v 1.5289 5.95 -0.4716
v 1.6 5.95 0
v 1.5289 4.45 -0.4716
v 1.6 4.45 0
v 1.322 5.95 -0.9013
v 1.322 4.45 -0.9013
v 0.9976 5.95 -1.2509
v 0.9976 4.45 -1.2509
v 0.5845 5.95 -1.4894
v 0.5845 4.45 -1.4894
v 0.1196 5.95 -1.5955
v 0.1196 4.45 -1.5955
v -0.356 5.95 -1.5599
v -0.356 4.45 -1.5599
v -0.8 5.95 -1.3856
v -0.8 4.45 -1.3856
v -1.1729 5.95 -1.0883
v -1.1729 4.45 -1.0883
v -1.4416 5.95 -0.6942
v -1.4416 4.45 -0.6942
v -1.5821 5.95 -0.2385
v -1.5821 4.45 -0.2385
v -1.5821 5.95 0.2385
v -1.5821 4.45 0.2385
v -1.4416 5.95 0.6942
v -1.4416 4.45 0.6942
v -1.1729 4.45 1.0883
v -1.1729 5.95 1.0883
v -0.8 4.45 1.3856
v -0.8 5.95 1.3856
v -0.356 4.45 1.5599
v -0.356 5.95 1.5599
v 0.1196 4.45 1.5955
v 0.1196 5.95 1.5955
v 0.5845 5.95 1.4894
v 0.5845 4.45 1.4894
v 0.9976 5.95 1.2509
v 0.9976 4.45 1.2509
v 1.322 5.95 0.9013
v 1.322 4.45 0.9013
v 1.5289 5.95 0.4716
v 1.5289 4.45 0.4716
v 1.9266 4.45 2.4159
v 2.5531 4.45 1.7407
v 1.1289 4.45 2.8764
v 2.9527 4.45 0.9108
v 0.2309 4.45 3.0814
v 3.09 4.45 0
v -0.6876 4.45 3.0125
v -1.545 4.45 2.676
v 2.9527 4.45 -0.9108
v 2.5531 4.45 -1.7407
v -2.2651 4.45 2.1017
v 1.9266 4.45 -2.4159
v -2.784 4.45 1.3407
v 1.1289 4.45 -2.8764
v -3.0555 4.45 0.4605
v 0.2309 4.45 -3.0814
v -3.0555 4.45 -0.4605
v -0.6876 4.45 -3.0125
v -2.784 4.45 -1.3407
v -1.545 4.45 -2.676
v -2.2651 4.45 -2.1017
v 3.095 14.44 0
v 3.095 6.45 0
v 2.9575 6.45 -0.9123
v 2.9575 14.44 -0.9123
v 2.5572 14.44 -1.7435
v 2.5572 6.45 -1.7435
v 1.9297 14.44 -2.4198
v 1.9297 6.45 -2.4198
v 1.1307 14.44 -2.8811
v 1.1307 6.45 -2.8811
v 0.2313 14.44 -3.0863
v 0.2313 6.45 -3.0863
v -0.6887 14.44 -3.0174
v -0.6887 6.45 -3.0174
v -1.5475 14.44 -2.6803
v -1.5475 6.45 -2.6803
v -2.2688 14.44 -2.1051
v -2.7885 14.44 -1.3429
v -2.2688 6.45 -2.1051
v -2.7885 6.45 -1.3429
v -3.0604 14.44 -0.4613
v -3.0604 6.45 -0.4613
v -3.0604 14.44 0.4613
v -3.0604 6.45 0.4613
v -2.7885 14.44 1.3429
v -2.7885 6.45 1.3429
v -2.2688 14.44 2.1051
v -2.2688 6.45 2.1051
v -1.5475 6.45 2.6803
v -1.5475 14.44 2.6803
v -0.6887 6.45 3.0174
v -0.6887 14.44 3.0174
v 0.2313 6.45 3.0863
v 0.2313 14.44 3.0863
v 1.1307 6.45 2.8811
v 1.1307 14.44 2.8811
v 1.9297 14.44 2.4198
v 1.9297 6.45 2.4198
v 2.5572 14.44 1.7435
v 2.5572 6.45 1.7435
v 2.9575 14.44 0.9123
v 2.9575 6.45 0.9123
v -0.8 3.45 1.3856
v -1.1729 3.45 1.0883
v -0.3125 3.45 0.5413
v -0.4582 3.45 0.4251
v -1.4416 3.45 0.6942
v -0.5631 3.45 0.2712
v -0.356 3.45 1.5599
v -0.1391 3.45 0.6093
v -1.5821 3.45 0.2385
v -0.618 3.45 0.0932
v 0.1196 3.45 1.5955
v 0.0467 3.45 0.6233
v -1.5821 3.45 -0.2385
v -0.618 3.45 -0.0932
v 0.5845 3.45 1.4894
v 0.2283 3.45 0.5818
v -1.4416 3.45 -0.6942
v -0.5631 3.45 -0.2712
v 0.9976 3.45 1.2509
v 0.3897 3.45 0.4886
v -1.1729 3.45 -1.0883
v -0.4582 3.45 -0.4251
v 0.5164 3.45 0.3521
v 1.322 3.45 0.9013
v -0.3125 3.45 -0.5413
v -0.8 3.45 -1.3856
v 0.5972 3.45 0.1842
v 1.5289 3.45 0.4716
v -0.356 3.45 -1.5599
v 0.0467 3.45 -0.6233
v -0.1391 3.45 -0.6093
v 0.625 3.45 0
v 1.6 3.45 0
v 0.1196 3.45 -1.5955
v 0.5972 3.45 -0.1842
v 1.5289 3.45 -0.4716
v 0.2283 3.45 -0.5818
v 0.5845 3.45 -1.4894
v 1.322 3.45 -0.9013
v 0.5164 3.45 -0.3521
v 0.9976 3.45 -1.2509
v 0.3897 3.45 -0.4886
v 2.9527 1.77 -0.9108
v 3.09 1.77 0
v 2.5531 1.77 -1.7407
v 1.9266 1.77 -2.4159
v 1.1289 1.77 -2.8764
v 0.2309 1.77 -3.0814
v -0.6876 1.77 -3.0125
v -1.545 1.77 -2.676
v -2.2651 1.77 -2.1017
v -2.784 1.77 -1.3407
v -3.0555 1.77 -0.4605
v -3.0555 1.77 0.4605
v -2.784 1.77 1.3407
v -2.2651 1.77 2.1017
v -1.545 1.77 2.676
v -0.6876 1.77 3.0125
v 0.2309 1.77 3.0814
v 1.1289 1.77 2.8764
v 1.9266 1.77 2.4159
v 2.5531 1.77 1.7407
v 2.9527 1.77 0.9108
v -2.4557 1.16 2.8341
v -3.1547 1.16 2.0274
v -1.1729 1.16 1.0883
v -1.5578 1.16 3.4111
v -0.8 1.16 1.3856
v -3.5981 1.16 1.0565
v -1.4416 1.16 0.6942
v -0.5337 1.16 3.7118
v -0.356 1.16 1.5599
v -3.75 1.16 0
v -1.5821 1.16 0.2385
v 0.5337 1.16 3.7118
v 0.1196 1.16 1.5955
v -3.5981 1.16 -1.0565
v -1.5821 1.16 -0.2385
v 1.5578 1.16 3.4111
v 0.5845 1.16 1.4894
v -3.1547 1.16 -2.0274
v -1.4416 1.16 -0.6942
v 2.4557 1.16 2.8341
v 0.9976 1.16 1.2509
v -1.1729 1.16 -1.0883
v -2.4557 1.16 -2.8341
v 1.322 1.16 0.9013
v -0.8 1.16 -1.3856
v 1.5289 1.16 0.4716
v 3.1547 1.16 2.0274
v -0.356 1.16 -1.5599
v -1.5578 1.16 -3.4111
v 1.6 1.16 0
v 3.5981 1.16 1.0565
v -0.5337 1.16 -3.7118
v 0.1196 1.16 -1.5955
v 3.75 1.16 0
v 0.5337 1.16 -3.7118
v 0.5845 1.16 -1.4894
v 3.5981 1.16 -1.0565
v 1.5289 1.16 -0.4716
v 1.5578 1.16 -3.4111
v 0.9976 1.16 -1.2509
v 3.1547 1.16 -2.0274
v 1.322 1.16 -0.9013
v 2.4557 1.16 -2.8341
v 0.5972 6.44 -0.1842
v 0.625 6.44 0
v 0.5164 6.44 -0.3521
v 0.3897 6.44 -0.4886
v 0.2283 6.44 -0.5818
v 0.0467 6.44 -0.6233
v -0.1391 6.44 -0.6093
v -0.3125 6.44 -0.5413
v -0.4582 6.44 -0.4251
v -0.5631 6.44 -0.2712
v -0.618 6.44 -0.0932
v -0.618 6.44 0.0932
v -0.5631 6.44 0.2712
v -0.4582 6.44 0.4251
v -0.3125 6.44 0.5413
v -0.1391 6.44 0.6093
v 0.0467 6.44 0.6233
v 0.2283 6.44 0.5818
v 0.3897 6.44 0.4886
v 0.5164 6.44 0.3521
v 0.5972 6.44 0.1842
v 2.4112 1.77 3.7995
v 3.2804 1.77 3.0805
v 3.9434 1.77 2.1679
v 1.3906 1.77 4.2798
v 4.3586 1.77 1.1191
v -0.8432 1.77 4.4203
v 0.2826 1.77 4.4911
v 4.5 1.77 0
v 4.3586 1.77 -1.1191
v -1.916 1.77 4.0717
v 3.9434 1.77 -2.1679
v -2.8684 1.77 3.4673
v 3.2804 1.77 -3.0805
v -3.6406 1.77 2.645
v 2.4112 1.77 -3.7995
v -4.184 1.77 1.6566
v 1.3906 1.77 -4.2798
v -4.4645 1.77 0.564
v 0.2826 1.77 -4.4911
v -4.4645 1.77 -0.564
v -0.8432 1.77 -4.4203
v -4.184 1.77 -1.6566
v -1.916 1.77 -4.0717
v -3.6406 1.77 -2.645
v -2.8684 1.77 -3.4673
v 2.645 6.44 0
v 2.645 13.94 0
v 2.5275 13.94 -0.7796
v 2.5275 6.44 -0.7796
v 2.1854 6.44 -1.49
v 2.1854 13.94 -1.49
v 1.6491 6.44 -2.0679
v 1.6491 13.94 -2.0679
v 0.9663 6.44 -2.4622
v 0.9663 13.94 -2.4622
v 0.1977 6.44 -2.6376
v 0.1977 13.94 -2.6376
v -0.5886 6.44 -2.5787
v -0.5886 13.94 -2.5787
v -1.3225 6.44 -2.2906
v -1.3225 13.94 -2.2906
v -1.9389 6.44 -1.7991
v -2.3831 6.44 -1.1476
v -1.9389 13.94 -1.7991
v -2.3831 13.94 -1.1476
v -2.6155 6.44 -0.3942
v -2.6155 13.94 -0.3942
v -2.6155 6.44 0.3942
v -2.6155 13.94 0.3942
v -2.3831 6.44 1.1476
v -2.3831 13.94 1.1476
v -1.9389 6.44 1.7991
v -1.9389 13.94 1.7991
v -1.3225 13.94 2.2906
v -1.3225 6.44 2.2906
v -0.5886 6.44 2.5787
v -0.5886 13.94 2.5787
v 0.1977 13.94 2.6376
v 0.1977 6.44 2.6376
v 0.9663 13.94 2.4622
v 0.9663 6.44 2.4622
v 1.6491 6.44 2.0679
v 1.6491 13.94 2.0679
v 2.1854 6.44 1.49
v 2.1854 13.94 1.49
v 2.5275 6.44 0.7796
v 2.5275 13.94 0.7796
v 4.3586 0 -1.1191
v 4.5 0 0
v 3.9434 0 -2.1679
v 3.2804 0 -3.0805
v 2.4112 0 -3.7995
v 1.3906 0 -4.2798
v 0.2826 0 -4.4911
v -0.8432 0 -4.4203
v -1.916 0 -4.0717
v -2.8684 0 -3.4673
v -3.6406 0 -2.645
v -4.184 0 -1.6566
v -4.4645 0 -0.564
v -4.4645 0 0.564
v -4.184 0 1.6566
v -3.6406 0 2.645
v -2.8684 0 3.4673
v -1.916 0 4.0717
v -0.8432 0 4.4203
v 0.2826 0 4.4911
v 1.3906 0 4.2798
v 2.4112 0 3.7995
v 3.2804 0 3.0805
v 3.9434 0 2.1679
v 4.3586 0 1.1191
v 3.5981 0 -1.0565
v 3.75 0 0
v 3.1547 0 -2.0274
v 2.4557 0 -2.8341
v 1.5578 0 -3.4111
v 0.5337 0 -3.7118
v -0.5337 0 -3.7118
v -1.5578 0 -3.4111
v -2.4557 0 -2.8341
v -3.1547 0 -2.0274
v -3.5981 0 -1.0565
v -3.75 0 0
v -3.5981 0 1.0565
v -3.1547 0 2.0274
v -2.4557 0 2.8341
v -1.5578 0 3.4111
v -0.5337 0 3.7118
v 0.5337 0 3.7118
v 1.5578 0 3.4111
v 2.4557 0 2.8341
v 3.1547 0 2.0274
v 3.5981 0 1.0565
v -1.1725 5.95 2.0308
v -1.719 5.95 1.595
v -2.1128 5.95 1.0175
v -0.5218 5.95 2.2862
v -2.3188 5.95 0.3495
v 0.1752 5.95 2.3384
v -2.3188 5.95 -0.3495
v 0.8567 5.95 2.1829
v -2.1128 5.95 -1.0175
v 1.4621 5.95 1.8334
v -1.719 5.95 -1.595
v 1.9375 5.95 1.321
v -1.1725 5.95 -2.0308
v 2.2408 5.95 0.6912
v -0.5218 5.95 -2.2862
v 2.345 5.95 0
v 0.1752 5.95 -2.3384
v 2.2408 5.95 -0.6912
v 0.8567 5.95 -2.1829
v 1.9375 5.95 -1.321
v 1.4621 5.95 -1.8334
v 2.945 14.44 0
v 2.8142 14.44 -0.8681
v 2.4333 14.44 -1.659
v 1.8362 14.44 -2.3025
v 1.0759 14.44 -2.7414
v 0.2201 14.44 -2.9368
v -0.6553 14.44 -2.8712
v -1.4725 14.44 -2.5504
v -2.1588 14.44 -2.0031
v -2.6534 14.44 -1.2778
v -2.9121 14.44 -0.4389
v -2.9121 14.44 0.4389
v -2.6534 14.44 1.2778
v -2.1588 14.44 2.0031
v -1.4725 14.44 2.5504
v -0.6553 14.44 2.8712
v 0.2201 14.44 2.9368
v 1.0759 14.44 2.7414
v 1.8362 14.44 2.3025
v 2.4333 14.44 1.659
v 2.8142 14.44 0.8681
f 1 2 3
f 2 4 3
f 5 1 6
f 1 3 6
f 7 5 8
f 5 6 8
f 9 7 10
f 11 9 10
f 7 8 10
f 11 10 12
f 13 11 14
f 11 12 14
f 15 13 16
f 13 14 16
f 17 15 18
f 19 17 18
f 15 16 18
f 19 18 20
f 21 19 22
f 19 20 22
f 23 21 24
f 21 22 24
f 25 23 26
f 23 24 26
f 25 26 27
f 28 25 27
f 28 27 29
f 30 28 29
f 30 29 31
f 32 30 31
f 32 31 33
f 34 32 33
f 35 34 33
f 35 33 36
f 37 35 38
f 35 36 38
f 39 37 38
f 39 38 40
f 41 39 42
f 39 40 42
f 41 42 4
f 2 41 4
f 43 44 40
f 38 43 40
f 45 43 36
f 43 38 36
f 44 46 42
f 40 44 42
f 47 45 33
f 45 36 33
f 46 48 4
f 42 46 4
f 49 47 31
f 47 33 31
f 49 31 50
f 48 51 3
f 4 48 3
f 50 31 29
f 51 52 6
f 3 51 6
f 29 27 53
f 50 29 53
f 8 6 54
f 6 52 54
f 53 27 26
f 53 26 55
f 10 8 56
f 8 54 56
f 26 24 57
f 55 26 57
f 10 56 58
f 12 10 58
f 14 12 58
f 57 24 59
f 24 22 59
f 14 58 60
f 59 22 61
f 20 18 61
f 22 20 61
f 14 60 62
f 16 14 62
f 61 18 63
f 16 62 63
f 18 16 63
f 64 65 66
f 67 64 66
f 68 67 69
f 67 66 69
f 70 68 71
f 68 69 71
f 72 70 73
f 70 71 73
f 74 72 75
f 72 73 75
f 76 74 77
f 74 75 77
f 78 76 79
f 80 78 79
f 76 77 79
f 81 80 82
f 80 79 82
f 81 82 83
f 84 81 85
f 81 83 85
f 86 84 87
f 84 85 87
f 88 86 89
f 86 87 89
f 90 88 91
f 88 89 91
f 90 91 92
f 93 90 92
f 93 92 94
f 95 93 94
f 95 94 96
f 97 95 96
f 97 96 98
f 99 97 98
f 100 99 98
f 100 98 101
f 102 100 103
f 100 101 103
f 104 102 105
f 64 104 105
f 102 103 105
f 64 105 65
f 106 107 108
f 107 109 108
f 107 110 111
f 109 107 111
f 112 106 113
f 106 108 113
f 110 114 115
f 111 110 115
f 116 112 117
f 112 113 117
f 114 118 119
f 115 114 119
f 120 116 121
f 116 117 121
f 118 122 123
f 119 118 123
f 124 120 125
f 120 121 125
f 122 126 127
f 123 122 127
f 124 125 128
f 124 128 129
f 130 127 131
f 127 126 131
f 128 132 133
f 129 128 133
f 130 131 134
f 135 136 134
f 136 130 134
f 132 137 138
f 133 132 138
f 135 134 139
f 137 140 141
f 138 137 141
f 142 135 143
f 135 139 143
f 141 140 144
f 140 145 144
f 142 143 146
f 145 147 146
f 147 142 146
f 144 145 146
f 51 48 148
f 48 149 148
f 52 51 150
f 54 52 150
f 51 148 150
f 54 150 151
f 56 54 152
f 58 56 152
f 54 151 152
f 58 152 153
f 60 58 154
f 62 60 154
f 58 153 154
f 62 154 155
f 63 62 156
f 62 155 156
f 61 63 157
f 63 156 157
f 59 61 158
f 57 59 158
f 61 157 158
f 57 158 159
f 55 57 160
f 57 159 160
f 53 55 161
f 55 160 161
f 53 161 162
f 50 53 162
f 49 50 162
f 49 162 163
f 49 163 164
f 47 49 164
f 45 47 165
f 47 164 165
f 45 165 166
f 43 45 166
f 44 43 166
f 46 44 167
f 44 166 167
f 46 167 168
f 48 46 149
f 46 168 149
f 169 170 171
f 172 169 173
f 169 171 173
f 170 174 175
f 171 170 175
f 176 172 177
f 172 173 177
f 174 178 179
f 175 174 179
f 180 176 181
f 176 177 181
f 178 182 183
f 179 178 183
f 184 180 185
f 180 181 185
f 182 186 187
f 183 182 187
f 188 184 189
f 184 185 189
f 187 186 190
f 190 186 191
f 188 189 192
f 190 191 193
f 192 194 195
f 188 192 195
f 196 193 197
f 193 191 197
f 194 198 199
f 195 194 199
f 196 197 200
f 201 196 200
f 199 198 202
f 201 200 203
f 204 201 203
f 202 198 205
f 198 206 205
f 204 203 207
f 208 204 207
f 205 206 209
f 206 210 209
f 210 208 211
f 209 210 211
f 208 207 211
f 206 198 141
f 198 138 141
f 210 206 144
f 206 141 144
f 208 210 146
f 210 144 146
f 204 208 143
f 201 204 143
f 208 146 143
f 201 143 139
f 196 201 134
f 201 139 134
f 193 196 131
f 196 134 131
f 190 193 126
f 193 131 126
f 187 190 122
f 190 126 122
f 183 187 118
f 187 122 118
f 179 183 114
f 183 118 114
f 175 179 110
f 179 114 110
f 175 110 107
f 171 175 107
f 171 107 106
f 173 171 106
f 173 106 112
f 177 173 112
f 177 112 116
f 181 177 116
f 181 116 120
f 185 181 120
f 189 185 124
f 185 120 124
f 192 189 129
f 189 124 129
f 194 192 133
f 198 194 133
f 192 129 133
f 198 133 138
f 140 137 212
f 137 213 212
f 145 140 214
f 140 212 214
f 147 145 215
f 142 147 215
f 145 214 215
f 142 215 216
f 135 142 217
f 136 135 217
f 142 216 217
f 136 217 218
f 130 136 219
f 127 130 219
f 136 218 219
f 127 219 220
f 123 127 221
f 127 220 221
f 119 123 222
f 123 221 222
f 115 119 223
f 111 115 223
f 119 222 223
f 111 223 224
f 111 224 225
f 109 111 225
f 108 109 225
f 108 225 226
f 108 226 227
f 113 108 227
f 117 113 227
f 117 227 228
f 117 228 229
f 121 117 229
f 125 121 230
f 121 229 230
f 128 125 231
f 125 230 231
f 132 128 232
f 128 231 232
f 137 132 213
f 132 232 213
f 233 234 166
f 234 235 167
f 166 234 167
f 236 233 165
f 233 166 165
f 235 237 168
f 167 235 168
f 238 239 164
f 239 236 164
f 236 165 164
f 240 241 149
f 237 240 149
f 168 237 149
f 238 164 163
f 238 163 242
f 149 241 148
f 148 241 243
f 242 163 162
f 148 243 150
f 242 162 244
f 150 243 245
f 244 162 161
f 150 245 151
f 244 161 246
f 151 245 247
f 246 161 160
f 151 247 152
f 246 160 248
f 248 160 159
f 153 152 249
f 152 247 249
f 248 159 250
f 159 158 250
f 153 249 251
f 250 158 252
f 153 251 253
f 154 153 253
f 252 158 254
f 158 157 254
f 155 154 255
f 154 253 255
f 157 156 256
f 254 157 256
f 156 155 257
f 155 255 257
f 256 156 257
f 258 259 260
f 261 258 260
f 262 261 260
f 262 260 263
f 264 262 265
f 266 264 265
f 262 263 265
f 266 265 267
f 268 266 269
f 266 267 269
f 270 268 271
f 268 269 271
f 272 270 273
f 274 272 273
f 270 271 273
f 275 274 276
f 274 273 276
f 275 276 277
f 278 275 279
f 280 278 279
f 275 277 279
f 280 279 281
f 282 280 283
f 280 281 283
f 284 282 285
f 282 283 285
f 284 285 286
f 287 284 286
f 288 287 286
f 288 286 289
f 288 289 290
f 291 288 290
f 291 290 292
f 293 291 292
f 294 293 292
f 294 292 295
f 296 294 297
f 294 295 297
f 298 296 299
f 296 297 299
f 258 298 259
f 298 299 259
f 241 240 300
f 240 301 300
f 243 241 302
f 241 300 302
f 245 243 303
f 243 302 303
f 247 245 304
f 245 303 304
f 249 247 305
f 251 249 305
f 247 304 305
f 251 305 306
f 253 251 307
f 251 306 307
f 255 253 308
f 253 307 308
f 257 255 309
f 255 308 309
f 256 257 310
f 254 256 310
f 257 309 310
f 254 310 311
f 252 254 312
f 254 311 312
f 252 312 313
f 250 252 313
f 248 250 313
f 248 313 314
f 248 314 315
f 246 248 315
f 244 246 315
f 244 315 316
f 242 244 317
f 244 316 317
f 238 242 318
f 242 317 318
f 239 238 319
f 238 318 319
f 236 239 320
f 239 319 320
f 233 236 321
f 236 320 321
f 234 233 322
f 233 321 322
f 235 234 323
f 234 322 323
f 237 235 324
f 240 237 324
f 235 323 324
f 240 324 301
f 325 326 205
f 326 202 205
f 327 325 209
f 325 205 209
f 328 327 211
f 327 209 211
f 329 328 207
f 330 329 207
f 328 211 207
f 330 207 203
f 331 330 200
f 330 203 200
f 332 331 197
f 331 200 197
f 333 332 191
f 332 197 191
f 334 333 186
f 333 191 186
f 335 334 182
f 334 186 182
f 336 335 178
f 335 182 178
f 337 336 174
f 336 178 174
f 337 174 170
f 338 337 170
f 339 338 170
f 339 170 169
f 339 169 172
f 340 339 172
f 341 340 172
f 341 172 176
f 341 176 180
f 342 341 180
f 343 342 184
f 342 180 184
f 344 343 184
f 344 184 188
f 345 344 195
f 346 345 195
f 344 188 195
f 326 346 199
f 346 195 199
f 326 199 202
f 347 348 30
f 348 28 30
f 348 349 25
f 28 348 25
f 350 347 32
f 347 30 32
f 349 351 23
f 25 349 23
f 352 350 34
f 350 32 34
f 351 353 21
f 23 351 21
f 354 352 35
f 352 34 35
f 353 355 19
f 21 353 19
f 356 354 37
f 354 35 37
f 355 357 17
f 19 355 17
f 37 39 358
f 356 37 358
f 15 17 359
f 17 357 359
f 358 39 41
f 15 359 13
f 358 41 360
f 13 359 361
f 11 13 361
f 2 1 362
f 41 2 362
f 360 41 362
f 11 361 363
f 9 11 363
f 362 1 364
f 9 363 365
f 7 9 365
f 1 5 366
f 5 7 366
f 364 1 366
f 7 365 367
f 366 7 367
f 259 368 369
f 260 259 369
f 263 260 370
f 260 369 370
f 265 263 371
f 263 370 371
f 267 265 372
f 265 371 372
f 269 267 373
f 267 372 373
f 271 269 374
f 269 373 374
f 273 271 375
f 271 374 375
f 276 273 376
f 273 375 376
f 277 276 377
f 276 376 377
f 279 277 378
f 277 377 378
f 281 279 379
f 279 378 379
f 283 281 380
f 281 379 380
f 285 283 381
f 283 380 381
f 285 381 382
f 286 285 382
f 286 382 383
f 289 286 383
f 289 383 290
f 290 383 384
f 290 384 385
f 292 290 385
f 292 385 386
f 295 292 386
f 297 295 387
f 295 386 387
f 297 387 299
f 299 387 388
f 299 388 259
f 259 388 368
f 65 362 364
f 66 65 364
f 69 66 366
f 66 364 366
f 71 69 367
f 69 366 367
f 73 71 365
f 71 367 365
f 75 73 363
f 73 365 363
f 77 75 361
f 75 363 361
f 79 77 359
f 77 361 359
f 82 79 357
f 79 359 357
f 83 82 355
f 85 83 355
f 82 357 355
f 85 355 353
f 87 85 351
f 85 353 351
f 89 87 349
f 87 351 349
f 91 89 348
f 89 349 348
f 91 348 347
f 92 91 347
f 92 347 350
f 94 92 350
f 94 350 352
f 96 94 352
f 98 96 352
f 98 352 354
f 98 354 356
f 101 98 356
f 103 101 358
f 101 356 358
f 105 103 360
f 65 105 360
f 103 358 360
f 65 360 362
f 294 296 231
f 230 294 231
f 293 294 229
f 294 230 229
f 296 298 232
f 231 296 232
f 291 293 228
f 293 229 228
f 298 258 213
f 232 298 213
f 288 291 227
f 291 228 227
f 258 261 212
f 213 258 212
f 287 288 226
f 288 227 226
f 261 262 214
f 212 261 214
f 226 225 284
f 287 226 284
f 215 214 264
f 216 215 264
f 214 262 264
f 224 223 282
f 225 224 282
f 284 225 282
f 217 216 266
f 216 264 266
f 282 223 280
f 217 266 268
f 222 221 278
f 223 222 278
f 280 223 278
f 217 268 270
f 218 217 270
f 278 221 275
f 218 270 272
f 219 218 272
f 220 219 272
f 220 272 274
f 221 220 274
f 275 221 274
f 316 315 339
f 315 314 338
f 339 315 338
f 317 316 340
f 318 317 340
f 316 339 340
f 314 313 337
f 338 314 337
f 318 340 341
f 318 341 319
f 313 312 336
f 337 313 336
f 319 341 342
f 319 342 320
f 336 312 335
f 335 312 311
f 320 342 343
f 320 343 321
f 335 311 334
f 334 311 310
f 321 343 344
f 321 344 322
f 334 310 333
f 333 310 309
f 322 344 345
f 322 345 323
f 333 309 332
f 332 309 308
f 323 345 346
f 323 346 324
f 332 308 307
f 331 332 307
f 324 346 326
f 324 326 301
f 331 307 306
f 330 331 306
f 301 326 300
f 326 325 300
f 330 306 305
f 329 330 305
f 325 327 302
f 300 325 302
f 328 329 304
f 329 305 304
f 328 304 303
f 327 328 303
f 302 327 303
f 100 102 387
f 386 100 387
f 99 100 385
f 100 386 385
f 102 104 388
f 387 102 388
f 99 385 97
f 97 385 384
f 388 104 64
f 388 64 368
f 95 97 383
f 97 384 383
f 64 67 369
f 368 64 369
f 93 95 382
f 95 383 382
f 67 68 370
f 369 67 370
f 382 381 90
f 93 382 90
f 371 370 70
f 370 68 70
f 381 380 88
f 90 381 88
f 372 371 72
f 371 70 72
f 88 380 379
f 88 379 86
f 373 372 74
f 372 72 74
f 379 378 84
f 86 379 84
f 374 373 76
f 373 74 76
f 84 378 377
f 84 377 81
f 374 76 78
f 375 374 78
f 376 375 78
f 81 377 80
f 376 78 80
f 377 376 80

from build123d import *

# Parameters (mm, degrees)
CHAMFER1_SIZE  = 0.5
CHAMFER1_SIZE2 = 0.3
CHAMFER2_SIZE  = 0.5
CHAMFER2_SIZE2 = 0.75


with BuildPart() as part:
    # Sketch1 → Revolve1 (revolve)
    with BuildSketch(Plane.XY):
        Polygon((3.75, 0), (3.75, 1.16), (1.6, 1.16), (1.6, 3.45), (0.625, 3.45), (0.625, 6.44), (2.645, 6.44), (2.645, 14.44), (3.095, 14.44), (3.095, 5.95), (1.6, 5.95), (1.6, 4.45), (3.09, 4.45), (3.09, 1.77), (4.5, 1.77), (4.5, 0), align=None)
    revolve(axis=Axis((0, 0, 0), (0, 1, 0)))

    # Chamfer1
    chamfer1_edges = [part.edges().sort_by_distance(p)[0] for p in [
        (-2.645, 14.44, 0),
    ]]
    chamfer1_side = [part.faces().sort_by_distance(p)[0] for p in [
        (-2.645, 10.44, 0),
    ]]
    chamfer(chamfer1_edges, length=CHAMFER1_SIZE, length2=CHAMFER1_SIZE2, reference=chamfer1_side[0])

    # Chamfer2
    chamfer2_edges = [part.edges().sort_by_distance(p)[0] for p in [
        (-3.095, 5.95, 0),
    ]]
    chamfer2_side = [part.faces().sort_by_distance(p)[0] for p in [
        (-3.095, 10.195, 0),
    ]]
    chamfer(chamfer2_edges, length=CHAMFER2_SIZE, length2=CHAMFER2_SIZE2, reference=chamfer2_side[0])


solid = part.part
